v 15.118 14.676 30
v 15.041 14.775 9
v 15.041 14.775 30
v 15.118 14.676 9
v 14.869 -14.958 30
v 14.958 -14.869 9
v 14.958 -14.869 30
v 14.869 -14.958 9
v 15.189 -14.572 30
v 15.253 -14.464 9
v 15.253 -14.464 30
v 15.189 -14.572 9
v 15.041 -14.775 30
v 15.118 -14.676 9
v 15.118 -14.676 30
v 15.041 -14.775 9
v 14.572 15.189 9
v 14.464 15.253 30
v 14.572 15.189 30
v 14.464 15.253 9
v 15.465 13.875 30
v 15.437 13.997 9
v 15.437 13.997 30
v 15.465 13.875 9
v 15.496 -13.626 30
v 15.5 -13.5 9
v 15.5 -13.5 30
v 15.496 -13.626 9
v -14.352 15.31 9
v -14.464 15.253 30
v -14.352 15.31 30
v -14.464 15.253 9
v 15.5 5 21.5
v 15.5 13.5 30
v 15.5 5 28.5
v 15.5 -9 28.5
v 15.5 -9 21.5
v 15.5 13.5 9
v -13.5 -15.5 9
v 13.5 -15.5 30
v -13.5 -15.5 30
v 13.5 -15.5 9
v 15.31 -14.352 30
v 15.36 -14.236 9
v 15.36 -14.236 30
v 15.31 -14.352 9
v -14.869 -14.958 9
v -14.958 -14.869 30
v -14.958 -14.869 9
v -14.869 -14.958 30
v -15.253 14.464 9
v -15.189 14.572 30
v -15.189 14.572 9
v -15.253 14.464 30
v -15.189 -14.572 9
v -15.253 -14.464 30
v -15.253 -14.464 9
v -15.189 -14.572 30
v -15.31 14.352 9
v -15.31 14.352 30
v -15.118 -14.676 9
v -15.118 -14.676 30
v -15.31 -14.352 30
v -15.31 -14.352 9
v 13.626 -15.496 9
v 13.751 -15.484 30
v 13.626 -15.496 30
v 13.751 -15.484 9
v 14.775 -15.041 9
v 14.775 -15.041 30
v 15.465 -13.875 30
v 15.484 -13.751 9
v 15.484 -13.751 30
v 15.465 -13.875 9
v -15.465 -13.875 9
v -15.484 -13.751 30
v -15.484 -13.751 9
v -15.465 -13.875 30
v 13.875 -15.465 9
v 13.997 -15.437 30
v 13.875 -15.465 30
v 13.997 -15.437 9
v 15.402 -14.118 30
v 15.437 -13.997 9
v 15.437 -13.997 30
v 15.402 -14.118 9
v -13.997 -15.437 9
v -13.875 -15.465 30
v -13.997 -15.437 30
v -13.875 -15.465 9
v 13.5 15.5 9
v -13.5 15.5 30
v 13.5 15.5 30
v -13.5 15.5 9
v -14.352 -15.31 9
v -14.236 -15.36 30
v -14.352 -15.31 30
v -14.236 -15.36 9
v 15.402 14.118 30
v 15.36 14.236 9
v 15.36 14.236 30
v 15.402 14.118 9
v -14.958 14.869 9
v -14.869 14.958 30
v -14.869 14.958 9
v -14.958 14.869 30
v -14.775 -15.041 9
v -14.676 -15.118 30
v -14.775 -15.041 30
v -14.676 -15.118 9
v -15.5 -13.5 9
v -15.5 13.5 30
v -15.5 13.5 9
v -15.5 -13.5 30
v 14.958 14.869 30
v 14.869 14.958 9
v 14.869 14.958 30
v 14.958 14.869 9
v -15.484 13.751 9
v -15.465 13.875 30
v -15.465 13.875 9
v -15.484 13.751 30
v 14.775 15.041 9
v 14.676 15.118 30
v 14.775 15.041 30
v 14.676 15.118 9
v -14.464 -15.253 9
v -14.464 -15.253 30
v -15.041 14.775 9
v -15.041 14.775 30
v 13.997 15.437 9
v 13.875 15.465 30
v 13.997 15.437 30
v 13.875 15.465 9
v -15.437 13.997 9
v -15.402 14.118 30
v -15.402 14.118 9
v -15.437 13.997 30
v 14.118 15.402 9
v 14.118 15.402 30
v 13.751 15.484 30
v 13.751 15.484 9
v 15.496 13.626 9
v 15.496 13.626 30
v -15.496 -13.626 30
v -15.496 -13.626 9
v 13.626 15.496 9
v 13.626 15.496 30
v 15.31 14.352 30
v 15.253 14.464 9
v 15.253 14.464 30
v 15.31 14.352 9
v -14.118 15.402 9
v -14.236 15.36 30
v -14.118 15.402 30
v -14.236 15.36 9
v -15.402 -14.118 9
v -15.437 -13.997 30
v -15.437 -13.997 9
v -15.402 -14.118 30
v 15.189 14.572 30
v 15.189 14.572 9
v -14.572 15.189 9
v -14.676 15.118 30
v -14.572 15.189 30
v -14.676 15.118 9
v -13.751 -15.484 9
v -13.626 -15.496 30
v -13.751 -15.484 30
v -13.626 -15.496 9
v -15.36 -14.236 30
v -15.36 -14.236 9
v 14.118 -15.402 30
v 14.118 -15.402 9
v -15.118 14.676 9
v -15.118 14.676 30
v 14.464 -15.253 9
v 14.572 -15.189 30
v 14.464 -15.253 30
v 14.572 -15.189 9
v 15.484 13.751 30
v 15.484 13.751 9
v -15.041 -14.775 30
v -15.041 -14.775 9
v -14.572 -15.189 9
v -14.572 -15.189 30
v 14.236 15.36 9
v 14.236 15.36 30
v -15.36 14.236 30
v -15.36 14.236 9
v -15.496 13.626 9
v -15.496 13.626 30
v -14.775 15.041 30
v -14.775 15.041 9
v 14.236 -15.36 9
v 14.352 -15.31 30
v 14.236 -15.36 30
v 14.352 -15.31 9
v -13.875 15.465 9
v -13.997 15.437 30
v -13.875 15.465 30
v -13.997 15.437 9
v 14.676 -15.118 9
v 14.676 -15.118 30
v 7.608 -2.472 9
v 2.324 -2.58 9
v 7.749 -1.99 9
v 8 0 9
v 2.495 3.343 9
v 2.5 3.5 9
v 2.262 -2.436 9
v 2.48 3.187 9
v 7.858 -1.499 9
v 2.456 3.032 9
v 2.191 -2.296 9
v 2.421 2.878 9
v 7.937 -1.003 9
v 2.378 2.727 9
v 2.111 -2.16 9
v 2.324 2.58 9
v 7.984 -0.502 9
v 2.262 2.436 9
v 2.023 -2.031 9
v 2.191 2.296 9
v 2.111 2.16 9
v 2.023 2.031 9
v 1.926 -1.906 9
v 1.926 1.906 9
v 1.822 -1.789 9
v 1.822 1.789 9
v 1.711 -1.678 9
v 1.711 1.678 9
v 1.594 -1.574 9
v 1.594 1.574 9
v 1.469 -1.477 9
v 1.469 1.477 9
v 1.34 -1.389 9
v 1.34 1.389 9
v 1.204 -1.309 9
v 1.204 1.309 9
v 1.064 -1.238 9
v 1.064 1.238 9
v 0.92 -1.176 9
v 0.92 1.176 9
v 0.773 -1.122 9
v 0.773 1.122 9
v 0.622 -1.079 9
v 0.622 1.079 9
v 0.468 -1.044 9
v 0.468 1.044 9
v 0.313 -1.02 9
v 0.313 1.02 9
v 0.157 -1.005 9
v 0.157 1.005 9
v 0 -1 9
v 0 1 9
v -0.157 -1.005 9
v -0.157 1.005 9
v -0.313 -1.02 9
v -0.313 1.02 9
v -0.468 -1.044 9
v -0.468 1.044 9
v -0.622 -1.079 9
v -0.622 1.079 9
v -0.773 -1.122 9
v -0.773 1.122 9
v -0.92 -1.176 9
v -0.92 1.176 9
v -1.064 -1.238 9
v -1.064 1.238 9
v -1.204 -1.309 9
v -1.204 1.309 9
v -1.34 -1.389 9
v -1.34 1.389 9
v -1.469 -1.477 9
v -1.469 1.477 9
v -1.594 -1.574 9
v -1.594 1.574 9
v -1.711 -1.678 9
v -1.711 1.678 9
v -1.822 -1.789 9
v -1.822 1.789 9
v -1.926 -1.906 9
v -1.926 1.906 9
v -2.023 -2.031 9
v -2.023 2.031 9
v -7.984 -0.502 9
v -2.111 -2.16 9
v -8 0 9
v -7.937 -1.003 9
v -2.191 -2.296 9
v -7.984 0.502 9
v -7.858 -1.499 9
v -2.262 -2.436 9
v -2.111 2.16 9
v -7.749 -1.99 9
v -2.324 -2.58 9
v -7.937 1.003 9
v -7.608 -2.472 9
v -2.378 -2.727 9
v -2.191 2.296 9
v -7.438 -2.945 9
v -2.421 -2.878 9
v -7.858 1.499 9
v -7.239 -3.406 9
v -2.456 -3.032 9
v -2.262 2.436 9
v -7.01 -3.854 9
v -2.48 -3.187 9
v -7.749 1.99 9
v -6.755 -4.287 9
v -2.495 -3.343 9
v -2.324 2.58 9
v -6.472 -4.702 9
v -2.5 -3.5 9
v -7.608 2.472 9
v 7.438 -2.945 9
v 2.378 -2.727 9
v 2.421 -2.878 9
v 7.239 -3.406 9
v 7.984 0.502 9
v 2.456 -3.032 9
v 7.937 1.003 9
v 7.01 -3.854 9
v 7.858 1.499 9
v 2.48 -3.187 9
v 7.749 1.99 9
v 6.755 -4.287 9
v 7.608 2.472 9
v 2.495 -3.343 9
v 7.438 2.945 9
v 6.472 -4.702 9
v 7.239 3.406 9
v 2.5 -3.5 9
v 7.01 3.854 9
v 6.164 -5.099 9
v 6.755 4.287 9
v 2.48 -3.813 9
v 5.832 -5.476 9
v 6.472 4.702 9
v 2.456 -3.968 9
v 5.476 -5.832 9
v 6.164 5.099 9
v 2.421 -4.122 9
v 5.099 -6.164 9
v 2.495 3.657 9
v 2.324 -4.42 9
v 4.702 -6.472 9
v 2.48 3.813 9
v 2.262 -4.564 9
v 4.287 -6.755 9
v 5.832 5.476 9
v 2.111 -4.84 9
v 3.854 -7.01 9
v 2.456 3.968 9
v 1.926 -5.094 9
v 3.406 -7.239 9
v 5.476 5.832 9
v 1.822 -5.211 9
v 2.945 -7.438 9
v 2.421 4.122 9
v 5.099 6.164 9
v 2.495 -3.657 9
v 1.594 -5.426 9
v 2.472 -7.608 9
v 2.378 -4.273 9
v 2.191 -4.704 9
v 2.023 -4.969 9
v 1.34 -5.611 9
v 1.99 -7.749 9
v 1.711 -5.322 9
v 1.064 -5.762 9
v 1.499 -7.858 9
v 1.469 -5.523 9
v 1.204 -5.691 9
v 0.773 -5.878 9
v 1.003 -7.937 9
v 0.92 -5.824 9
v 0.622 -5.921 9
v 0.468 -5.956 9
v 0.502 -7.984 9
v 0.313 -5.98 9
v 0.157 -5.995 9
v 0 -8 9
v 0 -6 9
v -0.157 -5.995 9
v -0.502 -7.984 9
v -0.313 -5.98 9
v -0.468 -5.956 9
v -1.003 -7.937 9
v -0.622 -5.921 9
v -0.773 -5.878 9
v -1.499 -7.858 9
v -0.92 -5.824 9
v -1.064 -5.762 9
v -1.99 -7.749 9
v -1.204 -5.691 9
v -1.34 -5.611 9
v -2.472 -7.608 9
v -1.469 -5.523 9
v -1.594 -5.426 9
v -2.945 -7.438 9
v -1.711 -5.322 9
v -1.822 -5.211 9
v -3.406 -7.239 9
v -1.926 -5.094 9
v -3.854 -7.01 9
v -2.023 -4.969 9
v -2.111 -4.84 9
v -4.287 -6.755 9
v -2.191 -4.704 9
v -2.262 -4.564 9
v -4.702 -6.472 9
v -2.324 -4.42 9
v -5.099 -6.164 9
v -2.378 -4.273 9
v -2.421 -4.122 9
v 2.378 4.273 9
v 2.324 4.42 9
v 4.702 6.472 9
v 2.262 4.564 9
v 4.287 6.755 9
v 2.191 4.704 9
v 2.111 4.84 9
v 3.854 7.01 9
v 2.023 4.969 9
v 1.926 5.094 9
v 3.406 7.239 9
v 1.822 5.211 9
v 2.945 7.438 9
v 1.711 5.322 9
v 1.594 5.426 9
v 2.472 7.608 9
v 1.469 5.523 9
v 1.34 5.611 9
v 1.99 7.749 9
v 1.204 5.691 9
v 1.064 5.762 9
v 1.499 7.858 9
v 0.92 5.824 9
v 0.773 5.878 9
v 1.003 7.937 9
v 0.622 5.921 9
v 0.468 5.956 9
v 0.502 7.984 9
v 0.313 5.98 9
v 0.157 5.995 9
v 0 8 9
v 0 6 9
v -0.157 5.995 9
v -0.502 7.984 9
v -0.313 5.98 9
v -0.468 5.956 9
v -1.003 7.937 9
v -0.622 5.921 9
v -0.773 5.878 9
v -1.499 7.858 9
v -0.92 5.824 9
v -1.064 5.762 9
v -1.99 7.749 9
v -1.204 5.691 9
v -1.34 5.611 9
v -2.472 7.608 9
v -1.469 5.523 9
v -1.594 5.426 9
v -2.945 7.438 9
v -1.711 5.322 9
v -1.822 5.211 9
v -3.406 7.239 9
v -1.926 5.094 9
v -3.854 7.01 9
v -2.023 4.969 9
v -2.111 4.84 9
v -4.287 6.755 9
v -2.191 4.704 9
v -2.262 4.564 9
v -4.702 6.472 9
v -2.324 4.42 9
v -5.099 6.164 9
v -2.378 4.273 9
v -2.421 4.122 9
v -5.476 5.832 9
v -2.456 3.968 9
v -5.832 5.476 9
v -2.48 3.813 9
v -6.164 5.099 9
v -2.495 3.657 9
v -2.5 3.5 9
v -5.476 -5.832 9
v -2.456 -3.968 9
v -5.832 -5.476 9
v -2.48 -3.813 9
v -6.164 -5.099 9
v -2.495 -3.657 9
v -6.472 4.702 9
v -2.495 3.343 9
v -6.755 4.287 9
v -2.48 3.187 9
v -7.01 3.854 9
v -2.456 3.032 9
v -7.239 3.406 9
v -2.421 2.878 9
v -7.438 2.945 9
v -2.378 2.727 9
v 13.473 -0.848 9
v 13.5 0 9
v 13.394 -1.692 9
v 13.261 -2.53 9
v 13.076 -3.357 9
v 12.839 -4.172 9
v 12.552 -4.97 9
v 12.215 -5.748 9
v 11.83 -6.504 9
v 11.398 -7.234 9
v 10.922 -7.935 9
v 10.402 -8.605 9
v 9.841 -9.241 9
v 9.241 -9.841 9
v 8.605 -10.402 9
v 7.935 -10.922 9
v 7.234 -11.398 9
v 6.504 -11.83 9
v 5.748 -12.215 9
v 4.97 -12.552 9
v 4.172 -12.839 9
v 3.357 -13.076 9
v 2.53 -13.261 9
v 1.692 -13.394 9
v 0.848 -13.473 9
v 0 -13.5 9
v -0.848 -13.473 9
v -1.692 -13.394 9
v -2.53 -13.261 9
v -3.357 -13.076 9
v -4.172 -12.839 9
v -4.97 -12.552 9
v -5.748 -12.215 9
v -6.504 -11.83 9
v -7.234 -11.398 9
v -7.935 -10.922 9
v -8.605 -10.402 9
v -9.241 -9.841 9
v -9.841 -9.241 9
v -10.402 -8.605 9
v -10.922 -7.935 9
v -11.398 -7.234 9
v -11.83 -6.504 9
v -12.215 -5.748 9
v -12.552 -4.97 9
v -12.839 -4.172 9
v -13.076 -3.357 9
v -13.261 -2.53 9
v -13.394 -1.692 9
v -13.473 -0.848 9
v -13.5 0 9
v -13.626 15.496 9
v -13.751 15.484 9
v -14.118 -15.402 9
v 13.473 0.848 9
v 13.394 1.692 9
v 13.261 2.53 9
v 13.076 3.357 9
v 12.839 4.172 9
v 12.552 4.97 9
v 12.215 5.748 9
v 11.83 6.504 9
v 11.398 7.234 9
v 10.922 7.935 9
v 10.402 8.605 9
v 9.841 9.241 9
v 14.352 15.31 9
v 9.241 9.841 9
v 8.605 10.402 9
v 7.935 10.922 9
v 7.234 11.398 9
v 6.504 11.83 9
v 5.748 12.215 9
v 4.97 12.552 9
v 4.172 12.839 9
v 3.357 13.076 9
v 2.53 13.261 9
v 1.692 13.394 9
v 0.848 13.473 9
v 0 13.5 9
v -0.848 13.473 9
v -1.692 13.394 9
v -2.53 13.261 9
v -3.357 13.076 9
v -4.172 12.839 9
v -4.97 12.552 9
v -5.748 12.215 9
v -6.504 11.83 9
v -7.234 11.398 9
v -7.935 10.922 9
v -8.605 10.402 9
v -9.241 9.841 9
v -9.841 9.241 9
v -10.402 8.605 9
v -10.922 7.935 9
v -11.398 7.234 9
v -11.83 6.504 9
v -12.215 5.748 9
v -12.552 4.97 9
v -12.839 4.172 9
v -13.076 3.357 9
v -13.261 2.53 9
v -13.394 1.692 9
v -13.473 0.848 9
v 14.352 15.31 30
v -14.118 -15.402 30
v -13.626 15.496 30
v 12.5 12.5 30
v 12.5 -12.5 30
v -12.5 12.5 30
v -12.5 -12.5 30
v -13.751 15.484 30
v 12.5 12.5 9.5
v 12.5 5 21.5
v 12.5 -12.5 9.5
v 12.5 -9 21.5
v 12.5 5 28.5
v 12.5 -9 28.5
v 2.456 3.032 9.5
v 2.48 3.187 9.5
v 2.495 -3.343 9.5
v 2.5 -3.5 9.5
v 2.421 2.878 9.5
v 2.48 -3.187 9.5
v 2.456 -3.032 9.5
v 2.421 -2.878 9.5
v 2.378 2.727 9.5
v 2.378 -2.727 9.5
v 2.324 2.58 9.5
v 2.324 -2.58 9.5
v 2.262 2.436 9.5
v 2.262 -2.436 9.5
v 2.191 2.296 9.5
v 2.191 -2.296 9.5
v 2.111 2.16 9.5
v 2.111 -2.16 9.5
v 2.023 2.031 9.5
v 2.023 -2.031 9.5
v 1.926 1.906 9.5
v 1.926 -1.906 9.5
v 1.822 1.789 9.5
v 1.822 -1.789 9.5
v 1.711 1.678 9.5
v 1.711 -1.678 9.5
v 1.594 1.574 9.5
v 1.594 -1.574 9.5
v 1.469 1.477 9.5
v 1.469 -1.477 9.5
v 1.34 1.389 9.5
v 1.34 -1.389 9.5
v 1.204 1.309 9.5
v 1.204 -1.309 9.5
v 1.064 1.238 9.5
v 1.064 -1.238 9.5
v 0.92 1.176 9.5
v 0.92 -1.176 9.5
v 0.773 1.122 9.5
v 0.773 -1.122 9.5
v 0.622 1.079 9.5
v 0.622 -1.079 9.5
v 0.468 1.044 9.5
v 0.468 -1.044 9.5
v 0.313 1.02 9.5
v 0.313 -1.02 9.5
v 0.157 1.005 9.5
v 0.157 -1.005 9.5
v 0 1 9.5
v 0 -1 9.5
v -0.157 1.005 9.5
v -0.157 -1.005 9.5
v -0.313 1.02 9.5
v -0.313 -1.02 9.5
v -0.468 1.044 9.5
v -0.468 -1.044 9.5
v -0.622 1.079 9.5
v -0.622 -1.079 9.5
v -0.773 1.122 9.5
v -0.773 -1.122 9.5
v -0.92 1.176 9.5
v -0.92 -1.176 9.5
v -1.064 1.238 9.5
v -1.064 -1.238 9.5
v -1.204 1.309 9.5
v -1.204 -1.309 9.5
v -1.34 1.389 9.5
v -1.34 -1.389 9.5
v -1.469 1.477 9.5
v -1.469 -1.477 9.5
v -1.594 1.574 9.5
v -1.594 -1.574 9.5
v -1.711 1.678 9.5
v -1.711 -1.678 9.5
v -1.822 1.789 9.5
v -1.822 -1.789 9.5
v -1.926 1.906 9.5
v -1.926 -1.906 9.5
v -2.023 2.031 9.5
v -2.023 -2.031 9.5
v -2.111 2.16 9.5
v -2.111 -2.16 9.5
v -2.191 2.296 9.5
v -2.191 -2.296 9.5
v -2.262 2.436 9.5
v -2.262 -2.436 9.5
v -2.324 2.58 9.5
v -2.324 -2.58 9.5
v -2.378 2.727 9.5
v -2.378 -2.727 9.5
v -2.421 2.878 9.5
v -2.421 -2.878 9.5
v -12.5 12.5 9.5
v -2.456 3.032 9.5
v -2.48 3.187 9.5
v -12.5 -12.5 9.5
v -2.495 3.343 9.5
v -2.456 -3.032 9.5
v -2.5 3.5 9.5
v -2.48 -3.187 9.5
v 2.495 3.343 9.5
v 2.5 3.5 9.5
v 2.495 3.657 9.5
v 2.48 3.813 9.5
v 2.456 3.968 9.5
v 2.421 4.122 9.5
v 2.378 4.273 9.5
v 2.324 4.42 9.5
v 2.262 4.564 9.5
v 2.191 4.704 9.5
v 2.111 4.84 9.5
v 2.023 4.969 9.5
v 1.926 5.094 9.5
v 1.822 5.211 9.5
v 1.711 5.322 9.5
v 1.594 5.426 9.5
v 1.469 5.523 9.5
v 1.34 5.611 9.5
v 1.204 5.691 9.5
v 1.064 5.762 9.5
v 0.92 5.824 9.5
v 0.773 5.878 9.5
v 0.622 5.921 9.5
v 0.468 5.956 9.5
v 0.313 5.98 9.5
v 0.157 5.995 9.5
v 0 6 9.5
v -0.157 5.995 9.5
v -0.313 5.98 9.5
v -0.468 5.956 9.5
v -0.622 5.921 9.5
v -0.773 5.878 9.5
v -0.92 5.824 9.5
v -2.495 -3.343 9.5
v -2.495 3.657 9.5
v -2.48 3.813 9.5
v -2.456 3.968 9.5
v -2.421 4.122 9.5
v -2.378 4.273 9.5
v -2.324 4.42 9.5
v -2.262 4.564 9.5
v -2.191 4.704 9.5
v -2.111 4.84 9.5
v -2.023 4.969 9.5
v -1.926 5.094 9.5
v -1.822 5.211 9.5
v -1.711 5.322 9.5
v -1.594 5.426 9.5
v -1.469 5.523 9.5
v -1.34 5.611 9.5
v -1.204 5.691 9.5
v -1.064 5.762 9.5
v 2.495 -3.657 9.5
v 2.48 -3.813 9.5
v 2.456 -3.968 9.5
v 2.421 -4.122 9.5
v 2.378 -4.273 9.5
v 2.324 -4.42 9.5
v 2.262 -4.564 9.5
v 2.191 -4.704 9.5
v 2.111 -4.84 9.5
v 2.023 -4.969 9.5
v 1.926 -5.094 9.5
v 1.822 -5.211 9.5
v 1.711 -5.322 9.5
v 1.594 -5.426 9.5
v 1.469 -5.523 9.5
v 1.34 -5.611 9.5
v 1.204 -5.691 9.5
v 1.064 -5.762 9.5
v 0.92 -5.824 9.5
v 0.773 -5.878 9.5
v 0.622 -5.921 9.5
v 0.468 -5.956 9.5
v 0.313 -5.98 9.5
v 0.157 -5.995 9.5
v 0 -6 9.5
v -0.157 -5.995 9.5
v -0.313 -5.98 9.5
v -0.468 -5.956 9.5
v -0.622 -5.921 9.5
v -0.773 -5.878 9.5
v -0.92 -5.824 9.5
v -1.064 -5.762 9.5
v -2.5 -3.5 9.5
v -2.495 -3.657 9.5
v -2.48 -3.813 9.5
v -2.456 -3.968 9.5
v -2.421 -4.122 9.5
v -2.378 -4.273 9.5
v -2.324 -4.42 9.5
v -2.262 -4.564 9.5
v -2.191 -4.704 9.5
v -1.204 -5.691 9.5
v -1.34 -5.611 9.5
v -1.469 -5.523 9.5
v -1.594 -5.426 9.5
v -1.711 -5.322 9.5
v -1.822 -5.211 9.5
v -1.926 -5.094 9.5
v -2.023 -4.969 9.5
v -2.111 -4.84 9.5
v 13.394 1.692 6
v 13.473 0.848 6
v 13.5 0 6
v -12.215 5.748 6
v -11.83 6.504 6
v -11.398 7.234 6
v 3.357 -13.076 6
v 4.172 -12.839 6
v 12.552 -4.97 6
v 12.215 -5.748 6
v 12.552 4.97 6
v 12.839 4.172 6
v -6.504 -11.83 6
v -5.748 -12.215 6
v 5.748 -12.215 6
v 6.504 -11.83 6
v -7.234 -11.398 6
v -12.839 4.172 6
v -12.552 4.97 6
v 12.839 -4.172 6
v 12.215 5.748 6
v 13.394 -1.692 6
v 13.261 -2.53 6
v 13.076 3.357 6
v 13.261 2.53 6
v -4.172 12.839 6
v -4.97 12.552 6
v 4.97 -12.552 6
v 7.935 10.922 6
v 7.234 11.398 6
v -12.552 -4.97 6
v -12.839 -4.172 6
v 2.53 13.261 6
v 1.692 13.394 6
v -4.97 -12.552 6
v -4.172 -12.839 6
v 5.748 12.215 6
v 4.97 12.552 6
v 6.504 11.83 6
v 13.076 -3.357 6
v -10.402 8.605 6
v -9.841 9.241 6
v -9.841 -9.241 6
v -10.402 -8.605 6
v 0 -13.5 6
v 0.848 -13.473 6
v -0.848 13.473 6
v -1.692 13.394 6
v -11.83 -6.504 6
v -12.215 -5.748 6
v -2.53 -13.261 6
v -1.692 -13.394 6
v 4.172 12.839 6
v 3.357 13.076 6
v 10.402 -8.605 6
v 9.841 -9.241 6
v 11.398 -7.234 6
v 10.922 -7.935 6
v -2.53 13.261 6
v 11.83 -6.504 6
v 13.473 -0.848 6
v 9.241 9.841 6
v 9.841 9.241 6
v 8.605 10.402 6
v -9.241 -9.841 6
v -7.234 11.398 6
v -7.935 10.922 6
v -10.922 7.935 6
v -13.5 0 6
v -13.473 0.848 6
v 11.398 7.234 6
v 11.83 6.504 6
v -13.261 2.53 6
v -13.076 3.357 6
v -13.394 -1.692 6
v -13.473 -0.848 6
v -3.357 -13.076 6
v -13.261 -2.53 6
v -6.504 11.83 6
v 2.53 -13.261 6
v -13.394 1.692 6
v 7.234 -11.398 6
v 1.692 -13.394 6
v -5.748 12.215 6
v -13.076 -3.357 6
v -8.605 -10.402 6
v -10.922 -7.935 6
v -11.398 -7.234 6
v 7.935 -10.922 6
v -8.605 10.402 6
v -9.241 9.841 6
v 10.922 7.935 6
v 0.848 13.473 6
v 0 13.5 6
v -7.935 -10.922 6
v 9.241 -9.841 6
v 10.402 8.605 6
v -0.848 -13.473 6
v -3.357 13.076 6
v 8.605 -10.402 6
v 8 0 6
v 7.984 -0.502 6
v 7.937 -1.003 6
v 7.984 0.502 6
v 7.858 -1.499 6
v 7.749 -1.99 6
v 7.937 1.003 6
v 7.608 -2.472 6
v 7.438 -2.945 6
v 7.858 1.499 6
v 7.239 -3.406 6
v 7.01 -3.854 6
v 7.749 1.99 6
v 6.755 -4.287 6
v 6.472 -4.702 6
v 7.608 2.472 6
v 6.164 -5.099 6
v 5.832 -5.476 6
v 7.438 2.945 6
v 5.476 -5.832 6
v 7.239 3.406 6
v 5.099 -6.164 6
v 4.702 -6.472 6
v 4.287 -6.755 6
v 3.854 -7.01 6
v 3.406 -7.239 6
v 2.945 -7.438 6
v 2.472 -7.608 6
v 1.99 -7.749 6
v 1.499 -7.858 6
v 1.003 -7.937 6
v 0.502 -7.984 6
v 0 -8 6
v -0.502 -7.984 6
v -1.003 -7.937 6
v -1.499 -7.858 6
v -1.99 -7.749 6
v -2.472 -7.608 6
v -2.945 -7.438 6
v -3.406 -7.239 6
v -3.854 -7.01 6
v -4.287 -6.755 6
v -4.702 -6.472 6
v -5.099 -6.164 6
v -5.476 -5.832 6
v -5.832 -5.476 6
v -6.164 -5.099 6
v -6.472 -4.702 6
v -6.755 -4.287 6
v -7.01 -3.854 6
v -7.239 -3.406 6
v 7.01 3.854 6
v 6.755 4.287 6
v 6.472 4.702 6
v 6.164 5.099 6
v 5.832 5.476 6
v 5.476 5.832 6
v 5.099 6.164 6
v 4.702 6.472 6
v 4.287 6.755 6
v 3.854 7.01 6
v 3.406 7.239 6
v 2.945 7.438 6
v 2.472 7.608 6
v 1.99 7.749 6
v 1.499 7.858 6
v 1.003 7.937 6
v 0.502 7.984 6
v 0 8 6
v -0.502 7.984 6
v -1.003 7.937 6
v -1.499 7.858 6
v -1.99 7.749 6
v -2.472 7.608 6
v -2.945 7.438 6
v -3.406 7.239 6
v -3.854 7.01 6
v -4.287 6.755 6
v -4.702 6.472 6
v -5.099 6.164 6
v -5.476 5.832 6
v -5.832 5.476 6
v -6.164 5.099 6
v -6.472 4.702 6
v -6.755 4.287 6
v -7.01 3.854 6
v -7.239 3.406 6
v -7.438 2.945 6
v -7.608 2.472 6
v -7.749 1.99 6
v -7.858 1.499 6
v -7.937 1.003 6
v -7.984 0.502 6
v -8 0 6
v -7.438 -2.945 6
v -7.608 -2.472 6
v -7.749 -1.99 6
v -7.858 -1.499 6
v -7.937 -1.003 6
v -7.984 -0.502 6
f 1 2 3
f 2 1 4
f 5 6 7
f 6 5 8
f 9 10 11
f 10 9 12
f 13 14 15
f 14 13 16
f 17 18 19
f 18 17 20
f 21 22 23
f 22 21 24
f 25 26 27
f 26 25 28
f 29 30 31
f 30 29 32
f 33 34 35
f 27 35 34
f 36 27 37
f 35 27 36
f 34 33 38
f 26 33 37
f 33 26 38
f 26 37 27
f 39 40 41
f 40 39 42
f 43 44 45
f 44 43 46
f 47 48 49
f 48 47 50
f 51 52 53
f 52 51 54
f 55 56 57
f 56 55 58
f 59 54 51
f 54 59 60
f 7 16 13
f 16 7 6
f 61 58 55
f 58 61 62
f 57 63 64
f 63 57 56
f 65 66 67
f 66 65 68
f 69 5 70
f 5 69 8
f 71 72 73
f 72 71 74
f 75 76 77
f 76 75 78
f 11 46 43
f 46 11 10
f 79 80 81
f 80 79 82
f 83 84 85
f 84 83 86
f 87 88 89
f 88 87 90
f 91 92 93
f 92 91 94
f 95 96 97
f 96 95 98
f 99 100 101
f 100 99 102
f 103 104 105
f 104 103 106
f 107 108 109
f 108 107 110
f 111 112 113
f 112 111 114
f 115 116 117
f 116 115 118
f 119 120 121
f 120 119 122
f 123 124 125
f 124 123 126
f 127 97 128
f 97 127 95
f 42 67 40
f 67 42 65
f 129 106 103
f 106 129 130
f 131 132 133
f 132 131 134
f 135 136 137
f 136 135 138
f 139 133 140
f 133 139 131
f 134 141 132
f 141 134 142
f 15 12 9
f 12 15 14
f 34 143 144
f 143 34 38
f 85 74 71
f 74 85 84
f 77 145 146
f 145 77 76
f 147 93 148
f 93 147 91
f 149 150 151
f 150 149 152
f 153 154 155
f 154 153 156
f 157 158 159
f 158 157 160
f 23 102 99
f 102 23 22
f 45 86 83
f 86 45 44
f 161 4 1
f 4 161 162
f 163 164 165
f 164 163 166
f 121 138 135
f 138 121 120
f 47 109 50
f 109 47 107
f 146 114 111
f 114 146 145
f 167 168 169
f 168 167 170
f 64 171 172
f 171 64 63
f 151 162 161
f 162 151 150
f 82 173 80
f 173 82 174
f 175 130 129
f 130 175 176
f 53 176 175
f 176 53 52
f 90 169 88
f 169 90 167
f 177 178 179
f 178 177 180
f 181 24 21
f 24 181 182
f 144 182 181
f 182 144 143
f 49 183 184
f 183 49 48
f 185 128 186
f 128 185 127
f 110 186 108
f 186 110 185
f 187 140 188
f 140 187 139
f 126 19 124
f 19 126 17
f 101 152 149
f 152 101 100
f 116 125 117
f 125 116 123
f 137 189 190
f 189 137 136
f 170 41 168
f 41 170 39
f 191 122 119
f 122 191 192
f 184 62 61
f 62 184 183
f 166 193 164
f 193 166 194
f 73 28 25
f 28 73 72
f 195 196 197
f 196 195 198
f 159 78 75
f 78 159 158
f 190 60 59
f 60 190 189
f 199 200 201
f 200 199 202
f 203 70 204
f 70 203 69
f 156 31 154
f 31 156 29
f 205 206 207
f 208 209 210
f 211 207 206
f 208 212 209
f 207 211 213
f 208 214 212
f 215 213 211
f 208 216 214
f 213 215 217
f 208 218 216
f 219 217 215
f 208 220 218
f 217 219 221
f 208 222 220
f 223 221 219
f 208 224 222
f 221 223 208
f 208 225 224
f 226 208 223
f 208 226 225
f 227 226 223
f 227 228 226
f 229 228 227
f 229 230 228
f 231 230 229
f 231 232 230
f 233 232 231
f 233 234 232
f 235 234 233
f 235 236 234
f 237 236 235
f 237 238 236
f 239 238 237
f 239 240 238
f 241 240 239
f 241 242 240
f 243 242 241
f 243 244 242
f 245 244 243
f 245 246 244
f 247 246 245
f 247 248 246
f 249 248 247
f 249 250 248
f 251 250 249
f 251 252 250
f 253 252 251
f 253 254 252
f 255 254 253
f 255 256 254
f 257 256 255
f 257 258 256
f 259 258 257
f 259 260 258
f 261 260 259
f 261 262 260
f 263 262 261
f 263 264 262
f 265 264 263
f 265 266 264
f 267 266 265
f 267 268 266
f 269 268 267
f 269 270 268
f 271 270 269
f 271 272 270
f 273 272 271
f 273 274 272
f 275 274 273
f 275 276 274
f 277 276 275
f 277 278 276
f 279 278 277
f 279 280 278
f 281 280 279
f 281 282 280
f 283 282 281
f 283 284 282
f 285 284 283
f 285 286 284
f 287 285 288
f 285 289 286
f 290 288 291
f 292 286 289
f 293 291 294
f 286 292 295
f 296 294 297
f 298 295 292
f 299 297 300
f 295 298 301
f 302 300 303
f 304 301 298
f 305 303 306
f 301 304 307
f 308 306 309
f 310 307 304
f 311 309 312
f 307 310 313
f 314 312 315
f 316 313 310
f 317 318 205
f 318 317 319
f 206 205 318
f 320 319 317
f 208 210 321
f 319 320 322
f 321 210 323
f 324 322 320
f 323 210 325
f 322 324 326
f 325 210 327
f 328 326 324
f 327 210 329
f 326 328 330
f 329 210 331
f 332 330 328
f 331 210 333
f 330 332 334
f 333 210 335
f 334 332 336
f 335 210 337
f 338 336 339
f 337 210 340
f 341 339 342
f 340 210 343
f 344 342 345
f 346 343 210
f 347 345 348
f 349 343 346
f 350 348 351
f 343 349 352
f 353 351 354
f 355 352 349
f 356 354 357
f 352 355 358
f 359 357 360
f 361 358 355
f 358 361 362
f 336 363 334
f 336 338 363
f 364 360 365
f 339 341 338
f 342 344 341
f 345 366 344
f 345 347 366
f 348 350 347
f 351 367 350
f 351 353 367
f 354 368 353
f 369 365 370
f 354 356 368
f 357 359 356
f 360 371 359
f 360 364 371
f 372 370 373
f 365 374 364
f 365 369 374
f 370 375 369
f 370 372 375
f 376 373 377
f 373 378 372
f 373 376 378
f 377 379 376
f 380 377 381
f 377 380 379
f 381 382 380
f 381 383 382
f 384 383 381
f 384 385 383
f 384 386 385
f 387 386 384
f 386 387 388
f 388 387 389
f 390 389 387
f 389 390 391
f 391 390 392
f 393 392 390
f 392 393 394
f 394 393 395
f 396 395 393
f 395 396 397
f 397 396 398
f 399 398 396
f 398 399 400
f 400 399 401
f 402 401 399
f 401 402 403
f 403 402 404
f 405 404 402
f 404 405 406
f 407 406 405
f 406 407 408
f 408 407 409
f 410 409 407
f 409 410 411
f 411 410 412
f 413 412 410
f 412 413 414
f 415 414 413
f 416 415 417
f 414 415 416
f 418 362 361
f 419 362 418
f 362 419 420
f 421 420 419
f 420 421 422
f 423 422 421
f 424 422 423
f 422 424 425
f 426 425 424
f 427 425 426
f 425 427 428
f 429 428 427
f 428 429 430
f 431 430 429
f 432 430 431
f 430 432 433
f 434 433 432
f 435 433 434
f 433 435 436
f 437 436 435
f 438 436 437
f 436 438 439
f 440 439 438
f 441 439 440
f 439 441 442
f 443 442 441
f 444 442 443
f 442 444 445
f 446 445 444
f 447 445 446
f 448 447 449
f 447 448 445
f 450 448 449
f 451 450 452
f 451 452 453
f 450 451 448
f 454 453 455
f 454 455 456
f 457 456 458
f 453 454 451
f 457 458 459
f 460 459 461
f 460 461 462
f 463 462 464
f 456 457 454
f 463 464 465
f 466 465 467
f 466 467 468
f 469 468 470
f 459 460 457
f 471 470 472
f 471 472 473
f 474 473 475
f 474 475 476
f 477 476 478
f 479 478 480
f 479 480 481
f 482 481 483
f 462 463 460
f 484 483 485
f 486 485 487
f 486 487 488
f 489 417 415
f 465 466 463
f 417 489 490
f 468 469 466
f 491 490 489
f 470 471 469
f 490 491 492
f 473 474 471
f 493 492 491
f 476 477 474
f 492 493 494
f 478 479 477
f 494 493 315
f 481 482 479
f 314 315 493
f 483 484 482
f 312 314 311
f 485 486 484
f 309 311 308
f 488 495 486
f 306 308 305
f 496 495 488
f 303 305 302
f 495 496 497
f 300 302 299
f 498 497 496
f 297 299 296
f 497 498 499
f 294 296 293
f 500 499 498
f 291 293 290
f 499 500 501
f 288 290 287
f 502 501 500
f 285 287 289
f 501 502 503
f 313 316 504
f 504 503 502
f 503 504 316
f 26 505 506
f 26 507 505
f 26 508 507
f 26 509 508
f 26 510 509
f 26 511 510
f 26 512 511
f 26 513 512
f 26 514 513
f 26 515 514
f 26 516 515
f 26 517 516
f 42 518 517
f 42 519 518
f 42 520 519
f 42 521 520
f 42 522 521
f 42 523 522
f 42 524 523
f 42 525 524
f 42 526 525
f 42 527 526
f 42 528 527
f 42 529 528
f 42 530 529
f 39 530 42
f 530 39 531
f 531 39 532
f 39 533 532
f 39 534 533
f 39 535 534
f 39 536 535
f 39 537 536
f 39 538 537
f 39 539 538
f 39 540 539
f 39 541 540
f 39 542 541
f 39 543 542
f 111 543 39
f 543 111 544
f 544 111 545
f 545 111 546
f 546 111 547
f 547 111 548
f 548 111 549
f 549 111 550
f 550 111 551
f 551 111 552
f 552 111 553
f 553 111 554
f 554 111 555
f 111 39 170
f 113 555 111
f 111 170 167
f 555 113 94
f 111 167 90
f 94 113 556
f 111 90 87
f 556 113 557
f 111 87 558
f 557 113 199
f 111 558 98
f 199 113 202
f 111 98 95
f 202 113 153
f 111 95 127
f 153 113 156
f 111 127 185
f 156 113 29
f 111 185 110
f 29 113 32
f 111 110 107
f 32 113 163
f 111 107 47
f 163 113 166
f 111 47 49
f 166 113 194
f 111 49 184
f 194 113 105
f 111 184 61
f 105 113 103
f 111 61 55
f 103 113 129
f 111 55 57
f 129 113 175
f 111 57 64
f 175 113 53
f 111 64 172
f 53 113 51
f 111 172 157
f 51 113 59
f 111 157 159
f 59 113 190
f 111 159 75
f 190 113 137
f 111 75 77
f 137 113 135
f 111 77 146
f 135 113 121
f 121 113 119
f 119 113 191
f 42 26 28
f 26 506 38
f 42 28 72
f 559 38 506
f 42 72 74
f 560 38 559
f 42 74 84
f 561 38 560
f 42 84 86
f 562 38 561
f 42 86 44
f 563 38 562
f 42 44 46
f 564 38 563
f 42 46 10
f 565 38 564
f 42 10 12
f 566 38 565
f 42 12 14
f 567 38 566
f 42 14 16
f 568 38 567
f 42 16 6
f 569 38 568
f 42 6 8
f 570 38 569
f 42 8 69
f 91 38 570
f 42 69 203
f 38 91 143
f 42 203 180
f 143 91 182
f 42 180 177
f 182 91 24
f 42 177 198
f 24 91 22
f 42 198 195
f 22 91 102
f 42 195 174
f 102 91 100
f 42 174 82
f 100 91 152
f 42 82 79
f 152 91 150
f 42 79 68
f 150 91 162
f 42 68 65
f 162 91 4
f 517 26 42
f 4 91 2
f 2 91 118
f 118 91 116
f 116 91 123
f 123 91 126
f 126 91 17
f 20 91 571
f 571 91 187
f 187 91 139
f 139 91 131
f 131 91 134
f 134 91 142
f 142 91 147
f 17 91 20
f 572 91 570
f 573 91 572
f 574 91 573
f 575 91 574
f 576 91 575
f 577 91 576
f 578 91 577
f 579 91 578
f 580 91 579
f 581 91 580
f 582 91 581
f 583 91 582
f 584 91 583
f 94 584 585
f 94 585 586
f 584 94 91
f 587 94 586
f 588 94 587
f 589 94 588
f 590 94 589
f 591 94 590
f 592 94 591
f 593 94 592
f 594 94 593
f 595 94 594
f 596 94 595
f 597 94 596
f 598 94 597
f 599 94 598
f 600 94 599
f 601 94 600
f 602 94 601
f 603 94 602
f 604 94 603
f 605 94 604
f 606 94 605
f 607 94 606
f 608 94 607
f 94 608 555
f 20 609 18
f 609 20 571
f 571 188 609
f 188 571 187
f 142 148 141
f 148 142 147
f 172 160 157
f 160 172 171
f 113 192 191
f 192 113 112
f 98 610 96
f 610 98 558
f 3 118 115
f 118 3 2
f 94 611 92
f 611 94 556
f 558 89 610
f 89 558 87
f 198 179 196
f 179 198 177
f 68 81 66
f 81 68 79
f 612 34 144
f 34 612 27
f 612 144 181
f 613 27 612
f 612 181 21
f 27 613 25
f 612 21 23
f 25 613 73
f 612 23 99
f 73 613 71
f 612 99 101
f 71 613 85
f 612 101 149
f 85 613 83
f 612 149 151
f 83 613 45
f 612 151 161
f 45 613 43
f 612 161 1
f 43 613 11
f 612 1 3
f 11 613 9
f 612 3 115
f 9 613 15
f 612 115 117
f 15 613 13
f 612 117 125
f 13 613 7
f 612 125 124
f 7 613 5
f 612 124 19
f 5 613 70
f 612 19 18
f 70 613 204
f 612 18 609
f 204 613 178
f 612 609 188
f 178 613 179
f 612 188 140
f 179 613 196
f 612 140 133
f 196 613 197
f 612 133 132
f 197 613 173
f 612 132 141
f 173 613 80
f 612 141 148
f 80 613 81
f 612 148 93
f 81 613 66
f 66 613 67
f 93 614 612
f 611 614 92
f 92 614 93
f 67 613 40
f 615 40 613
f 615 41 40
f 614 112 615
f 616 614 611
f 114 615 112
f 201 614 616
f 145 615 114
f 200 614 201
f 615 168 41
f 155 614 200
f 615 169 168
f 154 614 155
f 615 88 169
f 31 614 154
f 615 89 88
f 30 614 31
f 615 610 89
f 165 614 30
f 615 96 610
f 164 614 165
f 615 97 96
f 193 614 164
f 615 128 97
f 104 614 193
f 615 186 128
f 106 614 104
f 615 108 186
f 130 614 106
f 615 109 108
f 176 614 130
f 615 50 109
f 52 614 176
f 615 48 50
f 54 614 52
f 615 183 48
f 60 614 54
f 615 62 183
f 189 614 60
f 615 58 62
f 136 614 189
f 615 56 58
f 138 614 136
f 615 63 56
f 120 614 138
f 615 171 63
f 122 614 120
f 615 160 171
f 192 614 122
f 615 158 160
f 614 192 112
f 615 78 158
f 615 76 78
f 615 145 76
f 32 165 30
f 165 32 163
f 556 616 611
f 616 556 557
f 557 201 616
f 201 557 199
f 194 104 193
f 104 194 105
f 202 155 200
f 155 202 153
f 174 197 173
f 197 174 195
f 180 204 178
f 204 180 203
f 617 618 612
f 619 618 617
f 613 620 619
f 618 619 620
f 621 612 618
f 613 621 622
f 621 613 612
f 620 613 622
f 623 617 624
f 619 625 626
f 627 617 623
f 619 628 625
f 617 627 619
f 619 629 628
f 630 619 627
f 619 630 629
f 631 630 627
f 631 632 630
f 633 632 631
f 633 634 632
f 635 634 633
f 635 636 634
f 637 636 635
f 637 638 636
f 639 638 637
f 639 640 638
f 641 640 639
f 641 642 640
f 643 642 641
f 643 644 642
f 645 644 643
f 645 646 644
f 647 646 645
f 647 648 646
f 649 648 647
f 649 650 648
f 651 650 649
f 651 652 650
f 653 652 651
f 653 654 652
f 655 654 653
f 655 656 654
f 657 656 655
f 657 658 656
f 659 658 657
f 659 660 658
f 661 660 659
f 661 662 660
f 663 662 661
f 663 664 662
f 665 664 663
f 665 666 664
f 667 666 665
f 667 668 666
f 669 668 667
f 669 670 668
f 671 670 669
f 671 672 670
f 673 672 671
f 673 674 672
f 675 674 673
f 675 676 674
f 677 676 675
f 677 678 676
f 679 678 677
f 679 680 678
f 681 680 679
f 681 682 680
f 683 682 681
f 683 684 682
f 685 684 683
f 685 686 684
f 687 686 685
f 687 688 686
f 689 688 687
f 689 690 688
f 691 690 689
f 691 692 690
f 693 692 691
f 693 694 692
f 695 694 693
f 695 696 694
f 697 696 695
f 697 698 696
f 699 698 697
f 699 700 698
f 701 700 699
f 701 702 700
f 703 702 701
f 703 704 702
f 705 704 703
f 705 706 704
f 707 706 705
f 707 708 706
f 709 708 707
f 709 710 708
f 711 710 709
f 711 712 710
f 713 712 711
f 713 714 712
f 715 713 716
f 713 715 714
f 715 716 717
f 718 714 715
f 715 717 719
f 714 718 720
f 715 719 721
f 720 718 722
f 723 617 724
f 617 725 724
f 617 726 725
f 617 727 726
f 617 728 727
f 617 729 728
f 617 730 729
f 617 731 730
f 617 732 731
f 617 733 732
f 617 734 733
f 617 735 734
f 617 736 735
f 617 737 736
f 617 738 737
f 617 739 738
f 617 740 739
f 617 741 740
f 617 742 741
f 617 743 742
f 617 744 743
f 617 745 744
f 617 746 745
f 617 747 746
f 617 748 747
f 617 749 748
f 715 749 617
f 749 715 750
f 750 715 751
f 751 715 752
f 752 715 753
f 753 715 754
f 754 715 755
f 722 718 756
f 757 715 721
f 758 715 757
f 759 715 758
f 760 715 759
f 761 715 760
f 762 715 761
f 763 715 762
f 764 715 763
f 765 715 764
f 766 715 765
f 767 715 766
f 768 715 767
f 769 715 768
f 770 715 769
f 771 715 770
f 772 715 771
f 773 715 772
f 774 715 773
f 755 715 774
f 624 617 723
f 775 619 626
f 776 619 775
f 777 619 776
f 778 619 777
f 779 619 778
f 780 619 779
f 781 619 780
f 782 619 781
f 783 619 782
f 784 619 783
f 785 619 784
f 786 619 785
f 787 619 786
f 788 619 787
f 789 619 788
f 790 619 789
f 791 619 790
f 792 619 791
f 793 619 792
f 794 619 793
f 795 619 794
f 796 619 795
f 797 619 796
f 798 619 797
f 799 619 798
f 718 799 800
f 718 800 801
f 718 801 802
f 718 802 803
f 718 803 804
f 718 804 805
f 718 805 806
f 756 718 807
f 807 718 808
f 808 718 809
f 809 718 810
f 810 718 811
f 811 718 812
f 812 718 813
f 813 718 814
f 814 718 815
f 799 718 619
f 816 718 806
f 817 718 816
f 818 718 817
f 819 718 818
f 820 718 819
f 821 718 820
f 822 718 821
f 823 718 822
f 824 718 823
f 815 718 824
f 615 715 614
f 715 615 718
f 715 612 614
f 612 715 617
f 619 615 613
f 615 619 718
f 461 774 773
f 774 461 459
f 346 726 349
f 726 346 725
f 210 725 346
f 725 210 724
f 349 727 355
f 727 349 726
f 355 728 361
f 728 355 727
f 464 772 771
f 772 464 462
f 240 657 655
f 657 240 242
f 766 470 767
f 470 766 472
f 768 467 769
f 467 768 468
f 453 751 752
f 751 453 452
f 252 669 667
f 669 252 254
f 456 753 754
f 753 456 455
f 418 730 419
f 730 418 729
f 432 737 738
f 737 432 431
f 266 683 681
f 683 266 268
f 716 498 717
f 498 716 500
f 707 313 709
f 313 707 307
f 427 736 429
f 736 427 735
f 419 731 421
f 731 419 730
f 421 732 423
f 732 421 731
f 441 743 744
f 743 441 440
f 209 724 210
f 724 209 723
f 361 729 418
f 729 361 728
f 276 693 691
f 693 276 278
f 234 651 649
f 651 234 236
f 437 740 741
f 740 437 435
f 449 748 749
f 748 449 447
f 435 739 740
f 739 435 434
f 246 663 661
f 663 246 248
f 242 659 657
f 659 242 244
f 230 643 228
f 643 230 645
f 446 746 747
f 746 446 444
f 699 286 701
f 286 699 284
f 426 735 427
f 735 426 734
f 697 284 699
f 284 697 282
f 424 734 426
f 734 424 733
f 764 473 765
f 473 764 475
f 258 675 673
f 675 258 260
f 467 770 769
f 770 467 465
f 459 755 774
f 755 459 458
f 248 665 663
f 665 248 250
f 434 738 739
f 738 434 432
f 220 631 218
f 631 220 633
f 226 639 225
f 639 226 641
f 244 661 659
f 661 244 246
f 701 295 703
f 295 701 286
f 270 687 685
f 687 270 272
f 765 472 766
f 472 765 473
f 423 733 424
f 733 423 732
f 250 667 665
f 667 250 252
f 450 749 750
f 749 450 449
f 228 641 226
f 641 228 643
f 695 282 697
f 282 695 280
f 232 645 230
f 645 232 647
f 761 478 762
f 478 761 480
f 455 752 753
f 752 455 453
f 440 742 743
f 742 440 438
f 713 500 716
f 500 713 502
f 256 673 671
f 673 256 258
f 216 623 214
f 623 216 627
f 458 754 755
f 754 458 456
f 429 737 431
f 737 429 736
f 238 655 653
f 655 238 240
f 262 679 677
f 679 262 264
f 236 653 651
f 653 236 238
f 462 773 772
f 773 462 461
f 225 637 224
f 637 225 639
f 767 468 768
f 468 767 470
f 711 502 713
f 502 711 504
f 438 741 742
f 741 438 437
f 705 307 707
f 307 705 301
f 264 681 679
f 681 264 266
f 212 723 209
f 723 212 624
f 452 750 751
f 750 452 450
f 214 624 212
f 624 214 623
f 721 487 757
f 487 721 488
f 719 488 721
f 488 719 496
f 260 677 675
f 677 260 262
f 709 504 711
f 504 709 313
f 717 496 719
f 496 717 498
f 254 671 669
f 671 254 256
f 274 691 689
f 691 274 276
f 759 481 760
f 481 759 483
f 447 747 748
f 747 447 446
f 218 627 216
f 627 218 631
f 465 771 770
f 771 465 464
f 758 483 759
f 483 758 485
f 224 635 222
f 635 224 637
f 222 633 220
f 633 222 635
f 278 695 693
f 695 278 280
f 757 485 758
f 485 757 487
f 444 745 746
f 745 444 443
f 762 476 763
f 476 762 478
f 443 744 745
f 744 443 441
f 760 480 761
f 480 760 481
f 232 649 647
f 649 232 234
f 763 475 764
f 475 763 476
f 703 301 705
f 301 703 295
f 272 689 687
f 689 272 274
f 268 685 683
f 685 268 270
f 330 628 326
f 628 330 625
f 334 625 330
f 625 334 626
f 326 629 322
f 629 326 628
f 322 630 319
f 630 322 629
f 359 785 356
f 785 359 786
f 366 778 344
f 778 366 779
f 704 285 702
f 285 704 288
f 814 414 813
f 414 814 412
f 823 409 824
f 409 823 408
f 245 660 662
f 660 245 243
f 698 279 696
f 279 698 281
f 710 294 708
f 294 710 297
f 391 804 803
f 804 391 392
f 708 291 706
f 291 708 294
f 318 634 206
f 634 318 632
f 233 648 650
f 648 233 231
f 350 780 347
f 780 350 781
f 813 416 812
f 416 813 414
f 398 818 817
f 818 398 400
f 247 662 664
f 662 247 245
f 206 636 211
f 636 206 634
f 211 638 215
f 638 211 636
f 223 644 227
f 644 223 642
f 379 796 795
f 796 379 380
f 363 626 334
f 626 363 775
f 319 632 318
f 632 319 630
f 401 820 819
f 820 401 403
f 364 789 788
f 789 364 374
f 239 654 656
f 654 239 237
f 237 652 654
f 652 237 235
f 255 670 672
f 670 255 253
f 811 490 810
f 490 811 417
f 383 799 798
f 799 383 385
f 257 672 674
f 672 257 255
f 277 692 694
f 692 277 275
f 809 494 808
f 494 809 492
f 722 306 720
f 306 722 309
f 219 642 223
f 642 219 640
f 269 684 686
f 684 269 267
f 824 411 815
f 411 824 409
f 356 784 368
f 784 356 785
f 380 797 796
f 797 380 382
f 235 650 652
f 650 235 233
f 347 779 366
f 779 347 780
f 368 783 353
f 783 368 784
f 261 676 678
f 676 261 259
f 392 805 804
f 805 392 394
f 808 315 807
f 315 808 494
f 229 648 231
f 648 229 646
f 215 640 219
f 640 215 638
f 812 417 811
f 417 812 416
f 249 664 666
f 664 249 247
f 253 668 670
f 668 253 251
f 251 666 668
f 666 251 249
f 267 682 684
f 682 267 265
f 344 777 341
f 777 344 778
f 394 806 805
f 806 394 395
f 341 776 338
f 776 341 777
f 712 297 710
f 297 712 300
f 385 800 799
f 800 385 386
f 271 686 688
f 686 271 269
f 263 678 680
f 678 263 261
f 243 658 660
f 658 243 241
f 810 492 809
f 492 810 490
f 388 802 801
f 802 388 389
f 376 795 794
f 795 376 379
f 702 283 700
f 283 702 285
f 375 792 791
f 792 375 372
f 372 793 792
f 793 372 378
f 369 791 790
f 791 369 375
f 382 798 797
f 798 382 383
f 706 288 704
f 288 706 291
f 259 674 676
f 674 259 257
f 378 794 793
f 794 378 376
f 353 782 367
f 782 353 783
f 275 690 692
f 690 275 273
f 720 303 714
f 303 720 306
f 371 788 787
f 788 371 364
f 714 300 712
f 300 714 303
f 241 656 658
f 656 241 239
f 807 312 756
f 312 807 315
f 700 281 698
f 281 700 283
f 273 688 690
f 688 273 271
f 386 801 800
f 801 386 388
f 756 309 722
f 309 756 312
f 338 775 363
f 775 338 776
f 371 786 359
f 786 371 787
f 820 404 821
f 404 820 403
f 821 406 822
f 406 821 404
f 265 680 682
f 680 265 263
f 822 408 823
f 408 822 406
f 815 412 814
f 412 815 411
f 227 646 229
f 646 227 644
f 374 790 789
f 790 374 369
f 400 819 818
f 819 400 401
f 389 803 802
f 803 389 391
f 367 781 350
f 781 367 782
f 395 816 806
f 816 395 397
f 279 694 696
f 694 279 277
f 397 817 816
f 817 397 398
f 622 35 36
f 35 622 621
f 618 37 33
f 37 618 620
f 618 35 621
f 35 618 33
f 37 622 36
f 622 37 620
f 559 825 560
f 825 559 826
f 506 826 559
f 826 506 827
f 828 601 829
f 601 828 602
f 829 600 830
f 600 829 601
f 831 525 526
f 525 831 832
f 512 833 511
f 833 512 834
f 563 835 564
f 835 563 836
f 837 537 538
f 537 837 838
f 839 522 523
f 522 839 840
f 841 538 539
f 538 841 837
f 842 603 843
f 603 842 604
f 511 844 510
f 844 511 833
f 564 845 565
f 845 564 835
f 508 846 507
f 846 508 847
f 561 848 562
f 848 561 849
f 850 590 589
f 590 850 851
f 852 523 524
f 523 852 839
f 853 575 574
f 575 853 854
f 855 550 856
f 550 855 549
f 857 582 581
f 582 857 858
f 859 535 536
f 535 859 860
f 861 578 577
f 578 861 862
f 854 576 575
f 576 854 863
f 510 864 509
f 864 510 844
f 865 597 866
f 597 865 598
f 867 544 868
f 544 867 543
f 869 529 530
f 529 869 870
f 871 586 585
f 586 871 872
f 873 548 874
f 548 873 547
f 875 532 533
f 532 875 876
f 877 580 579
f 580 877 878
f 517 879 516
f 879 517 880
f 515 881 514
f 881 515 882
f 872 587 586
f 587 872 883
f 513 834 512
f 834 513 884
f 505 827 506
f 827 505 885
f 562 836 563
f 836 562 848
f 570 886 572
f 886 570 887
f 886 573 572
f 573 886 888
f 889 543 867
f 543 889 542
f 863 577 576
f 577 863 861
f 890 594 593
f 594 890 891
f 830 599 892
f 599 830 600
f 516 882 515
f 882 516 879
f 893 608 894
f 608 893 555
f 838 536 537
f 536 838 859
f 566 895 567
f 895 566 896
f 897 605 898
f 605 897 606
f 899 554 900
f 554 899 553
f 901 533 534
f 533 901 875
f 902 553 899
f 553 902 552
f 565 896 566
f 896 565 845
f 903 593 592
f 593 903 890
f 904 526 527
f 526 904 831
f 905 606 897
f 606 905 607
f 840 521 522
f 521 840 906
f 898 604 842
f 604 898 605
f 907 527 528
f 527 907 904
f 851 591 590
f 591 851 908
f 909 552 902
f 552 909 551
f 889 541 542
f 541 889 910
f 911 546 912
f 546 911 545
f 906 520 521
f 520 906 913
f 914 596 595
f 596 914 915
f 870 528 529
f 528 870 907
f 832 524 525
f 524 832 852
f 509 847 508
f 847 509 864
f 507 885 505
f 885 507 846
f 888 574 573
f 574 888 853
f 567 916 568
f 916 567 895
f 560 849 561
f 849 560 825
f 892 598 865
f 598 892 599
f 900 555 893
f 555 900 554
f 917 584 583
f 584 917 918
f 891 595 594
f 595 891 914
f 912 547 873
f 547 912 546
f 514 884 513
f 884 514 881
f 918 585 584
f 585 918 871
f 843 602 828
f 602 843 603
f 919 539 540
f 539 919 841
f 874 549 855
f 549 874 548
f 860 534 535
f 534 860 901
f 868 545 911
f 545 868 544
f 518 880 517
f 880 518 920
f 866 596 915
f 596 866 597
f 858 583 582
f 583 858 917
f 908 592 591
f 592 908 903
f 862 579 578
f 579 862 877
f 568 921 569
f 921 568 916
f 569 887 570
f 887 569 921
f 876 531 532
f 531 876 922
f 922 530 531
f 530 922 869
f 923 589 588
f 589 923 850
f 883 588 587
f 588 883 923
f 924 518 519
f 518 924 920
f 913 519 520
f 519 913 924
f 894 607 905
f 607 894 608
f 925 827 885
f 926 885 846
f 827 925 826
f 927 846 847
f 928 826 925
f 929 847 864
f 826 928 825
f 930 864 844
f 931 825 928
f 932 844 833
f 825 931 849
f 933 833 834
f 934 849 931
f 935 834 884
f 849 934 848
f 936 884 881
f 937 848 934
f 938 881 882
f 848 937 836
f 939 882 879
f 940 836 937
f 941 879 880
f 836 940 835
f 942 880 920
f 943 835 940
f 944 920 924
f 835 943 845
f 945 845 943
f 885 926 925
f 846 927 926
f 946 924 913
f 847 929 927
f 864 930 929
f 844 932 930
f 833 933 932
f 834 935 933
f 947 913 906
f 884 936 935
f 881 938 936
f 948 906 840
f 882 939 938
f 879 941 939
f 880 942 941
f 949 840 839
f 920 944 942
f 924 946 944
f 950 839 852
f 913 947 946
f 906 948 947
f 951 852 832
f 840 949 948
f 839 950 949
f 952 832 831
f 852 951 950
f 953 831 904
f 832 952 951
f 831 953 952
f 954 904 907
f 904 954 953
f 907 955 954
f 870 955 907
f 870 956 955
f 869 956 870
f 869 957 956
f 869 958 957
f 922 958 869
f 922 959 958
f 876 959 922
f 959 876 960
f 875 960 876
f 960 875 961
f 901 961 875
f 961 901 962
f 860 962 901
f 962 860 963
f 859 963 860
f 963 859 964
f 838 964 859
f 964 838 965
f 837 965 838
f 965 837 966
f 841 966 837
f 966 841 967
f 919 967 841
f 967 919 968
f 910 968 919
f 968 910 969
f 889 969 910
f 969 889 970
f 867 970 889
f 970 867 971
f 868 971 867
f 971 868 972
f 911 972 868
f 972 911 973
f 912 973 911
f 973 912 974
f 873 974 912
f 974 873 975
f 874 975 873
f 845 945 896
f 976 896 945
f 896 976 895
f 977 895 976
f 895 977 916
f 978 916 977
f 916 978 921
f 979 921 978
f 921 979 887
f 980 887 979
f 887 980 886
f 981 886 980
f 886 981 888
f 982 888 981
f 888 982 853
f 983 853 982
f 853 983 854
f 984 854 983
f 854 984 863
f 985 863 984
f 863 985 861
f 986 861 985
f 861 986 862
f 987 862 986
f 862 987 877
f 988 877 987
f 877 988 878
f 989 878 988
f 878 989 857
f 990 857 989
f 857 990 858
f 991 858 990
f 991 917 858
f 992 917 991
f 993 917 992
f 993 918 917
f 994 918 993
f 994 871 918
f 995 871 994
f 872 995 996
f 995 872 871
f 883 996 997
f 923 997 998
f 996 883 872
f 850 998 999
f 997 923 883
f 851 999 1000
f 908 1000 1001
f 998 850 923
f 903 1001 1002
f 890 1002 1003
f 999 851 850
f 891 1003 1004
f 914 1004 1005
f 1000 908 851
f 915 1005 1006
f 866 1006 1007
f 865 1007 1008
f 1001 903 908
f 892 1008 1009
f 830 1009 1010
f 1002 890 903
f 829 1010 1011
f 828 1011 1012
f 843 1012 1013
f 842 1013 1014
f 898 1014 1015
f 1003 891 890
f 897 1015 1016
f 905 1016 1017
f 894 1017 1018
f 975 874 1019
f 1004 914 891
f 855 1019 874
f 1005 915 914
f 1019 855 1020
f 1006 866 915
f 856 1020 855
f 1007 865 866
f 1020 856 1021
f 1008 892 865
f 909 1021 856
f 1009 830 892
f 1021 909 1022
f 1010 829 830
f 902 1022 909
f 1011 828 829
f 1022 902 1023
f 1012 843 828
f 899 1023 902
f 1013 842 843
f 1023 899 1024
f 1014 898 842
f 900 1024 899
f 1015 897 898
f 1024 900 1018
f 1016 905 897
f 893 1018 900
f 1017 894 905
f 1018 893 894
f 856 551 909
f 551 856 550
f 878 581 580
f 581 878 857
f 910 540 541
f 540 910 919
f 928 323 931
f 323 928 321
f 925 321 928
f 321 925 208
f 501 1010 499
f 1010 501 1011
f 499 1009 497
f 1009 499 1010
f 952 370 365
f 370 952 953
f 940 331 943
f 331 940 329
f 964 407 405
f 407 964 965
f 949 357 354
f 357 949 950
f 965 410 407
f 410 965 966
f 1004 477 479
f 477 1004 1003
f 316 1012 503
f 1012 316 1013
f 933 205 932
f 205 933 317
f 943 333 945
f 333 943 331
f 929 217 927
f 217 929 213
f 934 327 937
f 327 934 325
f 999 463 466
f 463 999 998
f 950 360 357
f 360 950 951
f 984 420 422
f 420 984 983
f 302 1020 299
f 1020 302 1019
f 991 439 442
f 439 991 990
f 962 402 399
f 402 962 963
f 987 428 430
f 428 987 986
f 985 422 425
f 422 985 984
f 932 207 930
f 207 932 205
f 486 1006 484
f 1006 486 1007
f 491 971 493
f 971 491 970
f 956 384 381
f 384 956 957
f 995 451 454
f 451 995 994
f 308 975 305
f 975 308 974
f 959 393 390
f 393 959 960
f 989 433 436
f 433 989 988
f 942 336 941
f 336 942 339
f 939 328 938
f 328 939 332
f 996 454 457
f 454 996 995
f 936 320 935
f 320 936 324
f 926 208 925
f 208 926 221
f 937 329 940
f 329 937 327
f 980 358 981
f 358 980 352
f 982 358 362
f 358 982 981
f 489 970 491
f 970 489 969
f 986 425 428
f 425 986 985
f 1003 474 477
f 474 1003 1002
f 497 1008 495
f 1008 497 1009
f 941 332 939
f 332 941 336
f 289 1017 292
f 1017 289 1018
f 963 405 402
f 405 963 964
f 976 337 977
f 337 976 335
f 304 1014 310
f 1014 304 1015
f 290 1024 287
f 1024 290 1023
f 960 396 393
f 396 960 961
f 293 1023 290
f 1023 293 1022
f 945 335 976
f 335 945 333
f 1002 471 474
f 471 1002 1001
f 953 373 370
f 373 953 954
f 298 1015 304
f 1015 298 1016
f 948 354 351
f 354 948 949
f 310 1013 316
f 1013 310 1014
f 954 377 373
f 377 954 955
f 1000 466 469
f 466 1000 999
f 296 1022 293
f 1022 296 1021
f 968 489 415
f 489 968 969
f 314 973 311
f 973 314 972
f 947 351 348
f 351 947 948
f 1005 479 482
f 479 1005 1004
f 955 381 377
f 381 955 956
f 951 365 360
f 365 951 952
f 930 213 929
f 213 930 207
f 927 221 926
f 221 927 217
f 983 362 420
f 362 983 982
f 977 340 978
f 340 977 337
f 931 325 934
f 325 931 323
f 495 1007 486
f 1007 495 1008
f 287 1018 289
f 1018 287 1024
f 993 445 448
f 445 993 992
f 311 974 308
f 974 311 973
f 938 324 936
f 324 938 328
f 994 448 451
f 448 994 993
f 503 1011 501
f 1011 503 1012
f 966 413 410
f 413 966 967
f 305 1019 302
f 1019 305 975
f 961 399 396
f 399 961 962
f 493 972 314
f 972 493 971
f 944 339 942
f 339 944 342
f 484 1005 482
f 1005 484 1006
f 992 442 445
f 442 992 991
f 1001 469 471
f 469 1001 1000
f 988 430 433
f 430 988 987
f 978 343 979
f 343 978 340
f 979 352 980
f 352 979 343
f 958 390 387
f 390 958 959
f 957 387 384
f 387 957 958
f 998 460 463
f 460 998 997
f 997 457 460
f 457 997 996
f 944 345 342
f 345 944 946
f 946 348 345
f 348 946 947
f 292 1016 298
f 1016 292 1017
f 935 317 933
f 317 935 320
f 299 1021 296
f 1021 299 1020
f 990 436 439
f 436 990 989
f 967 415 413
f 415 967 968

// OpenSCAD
$fn = 100;

Magnet_Outer_Diameter = 27.0;
Magnet_Inner_Diameter = 16.0;
Magnet_Height = 5.0;

Border_Bottom = 1.0;
Border_Side = 2.0;

LED_Diameter = 5.0;
LED_Full_Distance = 12.0;
LED_Height = 8.0;
LED_Z_Offset = LED_Height - Magnet_Height;
StatusLED_Diameter = 5; // This is the LED in the cap

Corner_Radius = 2.0;
InnerWidth_X = 25.0;
InnerWidth_Y = 25.0;
InnerHeight = 19.0;

USBPort_Width = 14.0;
USBPort_Height = 7.0;
USBPort_Offset_Y = 11.5;
USBPort_Offset_Z = 12.5;

//MagnetRing();
ModuleBox();
//Cap();

module Cap()
{
    translate([0, 0, 0])
    {
        difference()
        {
            roundrect([InnerWidth_X + Border_Side, InnerWidth_Y + Border_Side], Corner_Radius, height=Border_Bottom);
            cylinder(h=100, d=StatusLED_Diameter, center = true);
        }
    }
    translate([0, 0, 2*Border_Bottom])
    {
        difference()
        {
            cube([InnerWidth_X, InnerWidth_Y, 3*Border_Bottom], center = true);
            cylinder(h=100, d=6, center = true);
        }
    }
}

module MagnetRing()
{
    translate([30, 0, 0])
    {
        difference()
        {
            cylinder(h = Magnet_Height + Border_Bottom +  LED_Z_Offset, d = Magnet_Outer_Diameter + 2*Border_Side);
            translate([0, 0, Border_Bottom])
            {
                Magnet(Magnet_Height + LED_Z_Offset);
            }            
            cylinder(h = Magnet_Height + Border_Bottom +  LED_Z_Offset, d = Magnet_Inner_Diameter - Border_Side);
        }
    }
}

module ModuleBox()
{
    translate([0, 0, Magnet_Height + Border_Bottom + LED_Z_Offset])
    {
        Box();
        translate([0, 0, -LED_Z_Offset])
        {
            Magnet(LED_Z_Offset);
        }
    }
}

module LEDHole(direction)
{
    translate([0, (LED_Full_Distance-LED_Diameter)/2*direction, 0])
    {
        cylinder(h = 10.0, d = LED_Diameter);
    }
}

module Magnet(height)
{
    difference()
    {
        cylinder(h = height, d = Magnet_Outer_Diameter);
        translate([0, 0, 0])
        {
            cylinder(h = height, d = Magnet_Inner_Diameter);
        }
    }
}

module Box()
{
    difference()
    {
        translate([0, 0, 0])
        {
            roundrect([InnerWidth_X + Border_Side, InnerWidth_Y + Border_Side], Corner_Radius, height=InnerHeight + 2*Border_Bottom);
        }
        translate([0, 0, Magnet_Height + LED_Z_Offset + 3*Border_Bottom])
        {
            cube([InnerWidth_X, InnerWidth_Y, InnerHeight + 2*Border_Bottom], center = true);
        }

        LEDHole(1);
        LEDHole(-1);
        USBHole();
    }
}

module USBHole()
{
    translate([0, 2.5-USBPort_Offset_Y, USBPort_Offset_Z])
    {
        cube([20, USBPort_Width, USBPort_Height]);
    }
}

module roundrect(size, radius, height)
{
    hull()
    {
        for (i = [0:3])
        {
            x = size.x * (i % 2 - 0.5);
            y = size.y * (floor(i/2) - 0.5);
            translate([x, y, 0])
            {
                cylinder(r = radius, h = height);
            }
        }
    }
}
 
